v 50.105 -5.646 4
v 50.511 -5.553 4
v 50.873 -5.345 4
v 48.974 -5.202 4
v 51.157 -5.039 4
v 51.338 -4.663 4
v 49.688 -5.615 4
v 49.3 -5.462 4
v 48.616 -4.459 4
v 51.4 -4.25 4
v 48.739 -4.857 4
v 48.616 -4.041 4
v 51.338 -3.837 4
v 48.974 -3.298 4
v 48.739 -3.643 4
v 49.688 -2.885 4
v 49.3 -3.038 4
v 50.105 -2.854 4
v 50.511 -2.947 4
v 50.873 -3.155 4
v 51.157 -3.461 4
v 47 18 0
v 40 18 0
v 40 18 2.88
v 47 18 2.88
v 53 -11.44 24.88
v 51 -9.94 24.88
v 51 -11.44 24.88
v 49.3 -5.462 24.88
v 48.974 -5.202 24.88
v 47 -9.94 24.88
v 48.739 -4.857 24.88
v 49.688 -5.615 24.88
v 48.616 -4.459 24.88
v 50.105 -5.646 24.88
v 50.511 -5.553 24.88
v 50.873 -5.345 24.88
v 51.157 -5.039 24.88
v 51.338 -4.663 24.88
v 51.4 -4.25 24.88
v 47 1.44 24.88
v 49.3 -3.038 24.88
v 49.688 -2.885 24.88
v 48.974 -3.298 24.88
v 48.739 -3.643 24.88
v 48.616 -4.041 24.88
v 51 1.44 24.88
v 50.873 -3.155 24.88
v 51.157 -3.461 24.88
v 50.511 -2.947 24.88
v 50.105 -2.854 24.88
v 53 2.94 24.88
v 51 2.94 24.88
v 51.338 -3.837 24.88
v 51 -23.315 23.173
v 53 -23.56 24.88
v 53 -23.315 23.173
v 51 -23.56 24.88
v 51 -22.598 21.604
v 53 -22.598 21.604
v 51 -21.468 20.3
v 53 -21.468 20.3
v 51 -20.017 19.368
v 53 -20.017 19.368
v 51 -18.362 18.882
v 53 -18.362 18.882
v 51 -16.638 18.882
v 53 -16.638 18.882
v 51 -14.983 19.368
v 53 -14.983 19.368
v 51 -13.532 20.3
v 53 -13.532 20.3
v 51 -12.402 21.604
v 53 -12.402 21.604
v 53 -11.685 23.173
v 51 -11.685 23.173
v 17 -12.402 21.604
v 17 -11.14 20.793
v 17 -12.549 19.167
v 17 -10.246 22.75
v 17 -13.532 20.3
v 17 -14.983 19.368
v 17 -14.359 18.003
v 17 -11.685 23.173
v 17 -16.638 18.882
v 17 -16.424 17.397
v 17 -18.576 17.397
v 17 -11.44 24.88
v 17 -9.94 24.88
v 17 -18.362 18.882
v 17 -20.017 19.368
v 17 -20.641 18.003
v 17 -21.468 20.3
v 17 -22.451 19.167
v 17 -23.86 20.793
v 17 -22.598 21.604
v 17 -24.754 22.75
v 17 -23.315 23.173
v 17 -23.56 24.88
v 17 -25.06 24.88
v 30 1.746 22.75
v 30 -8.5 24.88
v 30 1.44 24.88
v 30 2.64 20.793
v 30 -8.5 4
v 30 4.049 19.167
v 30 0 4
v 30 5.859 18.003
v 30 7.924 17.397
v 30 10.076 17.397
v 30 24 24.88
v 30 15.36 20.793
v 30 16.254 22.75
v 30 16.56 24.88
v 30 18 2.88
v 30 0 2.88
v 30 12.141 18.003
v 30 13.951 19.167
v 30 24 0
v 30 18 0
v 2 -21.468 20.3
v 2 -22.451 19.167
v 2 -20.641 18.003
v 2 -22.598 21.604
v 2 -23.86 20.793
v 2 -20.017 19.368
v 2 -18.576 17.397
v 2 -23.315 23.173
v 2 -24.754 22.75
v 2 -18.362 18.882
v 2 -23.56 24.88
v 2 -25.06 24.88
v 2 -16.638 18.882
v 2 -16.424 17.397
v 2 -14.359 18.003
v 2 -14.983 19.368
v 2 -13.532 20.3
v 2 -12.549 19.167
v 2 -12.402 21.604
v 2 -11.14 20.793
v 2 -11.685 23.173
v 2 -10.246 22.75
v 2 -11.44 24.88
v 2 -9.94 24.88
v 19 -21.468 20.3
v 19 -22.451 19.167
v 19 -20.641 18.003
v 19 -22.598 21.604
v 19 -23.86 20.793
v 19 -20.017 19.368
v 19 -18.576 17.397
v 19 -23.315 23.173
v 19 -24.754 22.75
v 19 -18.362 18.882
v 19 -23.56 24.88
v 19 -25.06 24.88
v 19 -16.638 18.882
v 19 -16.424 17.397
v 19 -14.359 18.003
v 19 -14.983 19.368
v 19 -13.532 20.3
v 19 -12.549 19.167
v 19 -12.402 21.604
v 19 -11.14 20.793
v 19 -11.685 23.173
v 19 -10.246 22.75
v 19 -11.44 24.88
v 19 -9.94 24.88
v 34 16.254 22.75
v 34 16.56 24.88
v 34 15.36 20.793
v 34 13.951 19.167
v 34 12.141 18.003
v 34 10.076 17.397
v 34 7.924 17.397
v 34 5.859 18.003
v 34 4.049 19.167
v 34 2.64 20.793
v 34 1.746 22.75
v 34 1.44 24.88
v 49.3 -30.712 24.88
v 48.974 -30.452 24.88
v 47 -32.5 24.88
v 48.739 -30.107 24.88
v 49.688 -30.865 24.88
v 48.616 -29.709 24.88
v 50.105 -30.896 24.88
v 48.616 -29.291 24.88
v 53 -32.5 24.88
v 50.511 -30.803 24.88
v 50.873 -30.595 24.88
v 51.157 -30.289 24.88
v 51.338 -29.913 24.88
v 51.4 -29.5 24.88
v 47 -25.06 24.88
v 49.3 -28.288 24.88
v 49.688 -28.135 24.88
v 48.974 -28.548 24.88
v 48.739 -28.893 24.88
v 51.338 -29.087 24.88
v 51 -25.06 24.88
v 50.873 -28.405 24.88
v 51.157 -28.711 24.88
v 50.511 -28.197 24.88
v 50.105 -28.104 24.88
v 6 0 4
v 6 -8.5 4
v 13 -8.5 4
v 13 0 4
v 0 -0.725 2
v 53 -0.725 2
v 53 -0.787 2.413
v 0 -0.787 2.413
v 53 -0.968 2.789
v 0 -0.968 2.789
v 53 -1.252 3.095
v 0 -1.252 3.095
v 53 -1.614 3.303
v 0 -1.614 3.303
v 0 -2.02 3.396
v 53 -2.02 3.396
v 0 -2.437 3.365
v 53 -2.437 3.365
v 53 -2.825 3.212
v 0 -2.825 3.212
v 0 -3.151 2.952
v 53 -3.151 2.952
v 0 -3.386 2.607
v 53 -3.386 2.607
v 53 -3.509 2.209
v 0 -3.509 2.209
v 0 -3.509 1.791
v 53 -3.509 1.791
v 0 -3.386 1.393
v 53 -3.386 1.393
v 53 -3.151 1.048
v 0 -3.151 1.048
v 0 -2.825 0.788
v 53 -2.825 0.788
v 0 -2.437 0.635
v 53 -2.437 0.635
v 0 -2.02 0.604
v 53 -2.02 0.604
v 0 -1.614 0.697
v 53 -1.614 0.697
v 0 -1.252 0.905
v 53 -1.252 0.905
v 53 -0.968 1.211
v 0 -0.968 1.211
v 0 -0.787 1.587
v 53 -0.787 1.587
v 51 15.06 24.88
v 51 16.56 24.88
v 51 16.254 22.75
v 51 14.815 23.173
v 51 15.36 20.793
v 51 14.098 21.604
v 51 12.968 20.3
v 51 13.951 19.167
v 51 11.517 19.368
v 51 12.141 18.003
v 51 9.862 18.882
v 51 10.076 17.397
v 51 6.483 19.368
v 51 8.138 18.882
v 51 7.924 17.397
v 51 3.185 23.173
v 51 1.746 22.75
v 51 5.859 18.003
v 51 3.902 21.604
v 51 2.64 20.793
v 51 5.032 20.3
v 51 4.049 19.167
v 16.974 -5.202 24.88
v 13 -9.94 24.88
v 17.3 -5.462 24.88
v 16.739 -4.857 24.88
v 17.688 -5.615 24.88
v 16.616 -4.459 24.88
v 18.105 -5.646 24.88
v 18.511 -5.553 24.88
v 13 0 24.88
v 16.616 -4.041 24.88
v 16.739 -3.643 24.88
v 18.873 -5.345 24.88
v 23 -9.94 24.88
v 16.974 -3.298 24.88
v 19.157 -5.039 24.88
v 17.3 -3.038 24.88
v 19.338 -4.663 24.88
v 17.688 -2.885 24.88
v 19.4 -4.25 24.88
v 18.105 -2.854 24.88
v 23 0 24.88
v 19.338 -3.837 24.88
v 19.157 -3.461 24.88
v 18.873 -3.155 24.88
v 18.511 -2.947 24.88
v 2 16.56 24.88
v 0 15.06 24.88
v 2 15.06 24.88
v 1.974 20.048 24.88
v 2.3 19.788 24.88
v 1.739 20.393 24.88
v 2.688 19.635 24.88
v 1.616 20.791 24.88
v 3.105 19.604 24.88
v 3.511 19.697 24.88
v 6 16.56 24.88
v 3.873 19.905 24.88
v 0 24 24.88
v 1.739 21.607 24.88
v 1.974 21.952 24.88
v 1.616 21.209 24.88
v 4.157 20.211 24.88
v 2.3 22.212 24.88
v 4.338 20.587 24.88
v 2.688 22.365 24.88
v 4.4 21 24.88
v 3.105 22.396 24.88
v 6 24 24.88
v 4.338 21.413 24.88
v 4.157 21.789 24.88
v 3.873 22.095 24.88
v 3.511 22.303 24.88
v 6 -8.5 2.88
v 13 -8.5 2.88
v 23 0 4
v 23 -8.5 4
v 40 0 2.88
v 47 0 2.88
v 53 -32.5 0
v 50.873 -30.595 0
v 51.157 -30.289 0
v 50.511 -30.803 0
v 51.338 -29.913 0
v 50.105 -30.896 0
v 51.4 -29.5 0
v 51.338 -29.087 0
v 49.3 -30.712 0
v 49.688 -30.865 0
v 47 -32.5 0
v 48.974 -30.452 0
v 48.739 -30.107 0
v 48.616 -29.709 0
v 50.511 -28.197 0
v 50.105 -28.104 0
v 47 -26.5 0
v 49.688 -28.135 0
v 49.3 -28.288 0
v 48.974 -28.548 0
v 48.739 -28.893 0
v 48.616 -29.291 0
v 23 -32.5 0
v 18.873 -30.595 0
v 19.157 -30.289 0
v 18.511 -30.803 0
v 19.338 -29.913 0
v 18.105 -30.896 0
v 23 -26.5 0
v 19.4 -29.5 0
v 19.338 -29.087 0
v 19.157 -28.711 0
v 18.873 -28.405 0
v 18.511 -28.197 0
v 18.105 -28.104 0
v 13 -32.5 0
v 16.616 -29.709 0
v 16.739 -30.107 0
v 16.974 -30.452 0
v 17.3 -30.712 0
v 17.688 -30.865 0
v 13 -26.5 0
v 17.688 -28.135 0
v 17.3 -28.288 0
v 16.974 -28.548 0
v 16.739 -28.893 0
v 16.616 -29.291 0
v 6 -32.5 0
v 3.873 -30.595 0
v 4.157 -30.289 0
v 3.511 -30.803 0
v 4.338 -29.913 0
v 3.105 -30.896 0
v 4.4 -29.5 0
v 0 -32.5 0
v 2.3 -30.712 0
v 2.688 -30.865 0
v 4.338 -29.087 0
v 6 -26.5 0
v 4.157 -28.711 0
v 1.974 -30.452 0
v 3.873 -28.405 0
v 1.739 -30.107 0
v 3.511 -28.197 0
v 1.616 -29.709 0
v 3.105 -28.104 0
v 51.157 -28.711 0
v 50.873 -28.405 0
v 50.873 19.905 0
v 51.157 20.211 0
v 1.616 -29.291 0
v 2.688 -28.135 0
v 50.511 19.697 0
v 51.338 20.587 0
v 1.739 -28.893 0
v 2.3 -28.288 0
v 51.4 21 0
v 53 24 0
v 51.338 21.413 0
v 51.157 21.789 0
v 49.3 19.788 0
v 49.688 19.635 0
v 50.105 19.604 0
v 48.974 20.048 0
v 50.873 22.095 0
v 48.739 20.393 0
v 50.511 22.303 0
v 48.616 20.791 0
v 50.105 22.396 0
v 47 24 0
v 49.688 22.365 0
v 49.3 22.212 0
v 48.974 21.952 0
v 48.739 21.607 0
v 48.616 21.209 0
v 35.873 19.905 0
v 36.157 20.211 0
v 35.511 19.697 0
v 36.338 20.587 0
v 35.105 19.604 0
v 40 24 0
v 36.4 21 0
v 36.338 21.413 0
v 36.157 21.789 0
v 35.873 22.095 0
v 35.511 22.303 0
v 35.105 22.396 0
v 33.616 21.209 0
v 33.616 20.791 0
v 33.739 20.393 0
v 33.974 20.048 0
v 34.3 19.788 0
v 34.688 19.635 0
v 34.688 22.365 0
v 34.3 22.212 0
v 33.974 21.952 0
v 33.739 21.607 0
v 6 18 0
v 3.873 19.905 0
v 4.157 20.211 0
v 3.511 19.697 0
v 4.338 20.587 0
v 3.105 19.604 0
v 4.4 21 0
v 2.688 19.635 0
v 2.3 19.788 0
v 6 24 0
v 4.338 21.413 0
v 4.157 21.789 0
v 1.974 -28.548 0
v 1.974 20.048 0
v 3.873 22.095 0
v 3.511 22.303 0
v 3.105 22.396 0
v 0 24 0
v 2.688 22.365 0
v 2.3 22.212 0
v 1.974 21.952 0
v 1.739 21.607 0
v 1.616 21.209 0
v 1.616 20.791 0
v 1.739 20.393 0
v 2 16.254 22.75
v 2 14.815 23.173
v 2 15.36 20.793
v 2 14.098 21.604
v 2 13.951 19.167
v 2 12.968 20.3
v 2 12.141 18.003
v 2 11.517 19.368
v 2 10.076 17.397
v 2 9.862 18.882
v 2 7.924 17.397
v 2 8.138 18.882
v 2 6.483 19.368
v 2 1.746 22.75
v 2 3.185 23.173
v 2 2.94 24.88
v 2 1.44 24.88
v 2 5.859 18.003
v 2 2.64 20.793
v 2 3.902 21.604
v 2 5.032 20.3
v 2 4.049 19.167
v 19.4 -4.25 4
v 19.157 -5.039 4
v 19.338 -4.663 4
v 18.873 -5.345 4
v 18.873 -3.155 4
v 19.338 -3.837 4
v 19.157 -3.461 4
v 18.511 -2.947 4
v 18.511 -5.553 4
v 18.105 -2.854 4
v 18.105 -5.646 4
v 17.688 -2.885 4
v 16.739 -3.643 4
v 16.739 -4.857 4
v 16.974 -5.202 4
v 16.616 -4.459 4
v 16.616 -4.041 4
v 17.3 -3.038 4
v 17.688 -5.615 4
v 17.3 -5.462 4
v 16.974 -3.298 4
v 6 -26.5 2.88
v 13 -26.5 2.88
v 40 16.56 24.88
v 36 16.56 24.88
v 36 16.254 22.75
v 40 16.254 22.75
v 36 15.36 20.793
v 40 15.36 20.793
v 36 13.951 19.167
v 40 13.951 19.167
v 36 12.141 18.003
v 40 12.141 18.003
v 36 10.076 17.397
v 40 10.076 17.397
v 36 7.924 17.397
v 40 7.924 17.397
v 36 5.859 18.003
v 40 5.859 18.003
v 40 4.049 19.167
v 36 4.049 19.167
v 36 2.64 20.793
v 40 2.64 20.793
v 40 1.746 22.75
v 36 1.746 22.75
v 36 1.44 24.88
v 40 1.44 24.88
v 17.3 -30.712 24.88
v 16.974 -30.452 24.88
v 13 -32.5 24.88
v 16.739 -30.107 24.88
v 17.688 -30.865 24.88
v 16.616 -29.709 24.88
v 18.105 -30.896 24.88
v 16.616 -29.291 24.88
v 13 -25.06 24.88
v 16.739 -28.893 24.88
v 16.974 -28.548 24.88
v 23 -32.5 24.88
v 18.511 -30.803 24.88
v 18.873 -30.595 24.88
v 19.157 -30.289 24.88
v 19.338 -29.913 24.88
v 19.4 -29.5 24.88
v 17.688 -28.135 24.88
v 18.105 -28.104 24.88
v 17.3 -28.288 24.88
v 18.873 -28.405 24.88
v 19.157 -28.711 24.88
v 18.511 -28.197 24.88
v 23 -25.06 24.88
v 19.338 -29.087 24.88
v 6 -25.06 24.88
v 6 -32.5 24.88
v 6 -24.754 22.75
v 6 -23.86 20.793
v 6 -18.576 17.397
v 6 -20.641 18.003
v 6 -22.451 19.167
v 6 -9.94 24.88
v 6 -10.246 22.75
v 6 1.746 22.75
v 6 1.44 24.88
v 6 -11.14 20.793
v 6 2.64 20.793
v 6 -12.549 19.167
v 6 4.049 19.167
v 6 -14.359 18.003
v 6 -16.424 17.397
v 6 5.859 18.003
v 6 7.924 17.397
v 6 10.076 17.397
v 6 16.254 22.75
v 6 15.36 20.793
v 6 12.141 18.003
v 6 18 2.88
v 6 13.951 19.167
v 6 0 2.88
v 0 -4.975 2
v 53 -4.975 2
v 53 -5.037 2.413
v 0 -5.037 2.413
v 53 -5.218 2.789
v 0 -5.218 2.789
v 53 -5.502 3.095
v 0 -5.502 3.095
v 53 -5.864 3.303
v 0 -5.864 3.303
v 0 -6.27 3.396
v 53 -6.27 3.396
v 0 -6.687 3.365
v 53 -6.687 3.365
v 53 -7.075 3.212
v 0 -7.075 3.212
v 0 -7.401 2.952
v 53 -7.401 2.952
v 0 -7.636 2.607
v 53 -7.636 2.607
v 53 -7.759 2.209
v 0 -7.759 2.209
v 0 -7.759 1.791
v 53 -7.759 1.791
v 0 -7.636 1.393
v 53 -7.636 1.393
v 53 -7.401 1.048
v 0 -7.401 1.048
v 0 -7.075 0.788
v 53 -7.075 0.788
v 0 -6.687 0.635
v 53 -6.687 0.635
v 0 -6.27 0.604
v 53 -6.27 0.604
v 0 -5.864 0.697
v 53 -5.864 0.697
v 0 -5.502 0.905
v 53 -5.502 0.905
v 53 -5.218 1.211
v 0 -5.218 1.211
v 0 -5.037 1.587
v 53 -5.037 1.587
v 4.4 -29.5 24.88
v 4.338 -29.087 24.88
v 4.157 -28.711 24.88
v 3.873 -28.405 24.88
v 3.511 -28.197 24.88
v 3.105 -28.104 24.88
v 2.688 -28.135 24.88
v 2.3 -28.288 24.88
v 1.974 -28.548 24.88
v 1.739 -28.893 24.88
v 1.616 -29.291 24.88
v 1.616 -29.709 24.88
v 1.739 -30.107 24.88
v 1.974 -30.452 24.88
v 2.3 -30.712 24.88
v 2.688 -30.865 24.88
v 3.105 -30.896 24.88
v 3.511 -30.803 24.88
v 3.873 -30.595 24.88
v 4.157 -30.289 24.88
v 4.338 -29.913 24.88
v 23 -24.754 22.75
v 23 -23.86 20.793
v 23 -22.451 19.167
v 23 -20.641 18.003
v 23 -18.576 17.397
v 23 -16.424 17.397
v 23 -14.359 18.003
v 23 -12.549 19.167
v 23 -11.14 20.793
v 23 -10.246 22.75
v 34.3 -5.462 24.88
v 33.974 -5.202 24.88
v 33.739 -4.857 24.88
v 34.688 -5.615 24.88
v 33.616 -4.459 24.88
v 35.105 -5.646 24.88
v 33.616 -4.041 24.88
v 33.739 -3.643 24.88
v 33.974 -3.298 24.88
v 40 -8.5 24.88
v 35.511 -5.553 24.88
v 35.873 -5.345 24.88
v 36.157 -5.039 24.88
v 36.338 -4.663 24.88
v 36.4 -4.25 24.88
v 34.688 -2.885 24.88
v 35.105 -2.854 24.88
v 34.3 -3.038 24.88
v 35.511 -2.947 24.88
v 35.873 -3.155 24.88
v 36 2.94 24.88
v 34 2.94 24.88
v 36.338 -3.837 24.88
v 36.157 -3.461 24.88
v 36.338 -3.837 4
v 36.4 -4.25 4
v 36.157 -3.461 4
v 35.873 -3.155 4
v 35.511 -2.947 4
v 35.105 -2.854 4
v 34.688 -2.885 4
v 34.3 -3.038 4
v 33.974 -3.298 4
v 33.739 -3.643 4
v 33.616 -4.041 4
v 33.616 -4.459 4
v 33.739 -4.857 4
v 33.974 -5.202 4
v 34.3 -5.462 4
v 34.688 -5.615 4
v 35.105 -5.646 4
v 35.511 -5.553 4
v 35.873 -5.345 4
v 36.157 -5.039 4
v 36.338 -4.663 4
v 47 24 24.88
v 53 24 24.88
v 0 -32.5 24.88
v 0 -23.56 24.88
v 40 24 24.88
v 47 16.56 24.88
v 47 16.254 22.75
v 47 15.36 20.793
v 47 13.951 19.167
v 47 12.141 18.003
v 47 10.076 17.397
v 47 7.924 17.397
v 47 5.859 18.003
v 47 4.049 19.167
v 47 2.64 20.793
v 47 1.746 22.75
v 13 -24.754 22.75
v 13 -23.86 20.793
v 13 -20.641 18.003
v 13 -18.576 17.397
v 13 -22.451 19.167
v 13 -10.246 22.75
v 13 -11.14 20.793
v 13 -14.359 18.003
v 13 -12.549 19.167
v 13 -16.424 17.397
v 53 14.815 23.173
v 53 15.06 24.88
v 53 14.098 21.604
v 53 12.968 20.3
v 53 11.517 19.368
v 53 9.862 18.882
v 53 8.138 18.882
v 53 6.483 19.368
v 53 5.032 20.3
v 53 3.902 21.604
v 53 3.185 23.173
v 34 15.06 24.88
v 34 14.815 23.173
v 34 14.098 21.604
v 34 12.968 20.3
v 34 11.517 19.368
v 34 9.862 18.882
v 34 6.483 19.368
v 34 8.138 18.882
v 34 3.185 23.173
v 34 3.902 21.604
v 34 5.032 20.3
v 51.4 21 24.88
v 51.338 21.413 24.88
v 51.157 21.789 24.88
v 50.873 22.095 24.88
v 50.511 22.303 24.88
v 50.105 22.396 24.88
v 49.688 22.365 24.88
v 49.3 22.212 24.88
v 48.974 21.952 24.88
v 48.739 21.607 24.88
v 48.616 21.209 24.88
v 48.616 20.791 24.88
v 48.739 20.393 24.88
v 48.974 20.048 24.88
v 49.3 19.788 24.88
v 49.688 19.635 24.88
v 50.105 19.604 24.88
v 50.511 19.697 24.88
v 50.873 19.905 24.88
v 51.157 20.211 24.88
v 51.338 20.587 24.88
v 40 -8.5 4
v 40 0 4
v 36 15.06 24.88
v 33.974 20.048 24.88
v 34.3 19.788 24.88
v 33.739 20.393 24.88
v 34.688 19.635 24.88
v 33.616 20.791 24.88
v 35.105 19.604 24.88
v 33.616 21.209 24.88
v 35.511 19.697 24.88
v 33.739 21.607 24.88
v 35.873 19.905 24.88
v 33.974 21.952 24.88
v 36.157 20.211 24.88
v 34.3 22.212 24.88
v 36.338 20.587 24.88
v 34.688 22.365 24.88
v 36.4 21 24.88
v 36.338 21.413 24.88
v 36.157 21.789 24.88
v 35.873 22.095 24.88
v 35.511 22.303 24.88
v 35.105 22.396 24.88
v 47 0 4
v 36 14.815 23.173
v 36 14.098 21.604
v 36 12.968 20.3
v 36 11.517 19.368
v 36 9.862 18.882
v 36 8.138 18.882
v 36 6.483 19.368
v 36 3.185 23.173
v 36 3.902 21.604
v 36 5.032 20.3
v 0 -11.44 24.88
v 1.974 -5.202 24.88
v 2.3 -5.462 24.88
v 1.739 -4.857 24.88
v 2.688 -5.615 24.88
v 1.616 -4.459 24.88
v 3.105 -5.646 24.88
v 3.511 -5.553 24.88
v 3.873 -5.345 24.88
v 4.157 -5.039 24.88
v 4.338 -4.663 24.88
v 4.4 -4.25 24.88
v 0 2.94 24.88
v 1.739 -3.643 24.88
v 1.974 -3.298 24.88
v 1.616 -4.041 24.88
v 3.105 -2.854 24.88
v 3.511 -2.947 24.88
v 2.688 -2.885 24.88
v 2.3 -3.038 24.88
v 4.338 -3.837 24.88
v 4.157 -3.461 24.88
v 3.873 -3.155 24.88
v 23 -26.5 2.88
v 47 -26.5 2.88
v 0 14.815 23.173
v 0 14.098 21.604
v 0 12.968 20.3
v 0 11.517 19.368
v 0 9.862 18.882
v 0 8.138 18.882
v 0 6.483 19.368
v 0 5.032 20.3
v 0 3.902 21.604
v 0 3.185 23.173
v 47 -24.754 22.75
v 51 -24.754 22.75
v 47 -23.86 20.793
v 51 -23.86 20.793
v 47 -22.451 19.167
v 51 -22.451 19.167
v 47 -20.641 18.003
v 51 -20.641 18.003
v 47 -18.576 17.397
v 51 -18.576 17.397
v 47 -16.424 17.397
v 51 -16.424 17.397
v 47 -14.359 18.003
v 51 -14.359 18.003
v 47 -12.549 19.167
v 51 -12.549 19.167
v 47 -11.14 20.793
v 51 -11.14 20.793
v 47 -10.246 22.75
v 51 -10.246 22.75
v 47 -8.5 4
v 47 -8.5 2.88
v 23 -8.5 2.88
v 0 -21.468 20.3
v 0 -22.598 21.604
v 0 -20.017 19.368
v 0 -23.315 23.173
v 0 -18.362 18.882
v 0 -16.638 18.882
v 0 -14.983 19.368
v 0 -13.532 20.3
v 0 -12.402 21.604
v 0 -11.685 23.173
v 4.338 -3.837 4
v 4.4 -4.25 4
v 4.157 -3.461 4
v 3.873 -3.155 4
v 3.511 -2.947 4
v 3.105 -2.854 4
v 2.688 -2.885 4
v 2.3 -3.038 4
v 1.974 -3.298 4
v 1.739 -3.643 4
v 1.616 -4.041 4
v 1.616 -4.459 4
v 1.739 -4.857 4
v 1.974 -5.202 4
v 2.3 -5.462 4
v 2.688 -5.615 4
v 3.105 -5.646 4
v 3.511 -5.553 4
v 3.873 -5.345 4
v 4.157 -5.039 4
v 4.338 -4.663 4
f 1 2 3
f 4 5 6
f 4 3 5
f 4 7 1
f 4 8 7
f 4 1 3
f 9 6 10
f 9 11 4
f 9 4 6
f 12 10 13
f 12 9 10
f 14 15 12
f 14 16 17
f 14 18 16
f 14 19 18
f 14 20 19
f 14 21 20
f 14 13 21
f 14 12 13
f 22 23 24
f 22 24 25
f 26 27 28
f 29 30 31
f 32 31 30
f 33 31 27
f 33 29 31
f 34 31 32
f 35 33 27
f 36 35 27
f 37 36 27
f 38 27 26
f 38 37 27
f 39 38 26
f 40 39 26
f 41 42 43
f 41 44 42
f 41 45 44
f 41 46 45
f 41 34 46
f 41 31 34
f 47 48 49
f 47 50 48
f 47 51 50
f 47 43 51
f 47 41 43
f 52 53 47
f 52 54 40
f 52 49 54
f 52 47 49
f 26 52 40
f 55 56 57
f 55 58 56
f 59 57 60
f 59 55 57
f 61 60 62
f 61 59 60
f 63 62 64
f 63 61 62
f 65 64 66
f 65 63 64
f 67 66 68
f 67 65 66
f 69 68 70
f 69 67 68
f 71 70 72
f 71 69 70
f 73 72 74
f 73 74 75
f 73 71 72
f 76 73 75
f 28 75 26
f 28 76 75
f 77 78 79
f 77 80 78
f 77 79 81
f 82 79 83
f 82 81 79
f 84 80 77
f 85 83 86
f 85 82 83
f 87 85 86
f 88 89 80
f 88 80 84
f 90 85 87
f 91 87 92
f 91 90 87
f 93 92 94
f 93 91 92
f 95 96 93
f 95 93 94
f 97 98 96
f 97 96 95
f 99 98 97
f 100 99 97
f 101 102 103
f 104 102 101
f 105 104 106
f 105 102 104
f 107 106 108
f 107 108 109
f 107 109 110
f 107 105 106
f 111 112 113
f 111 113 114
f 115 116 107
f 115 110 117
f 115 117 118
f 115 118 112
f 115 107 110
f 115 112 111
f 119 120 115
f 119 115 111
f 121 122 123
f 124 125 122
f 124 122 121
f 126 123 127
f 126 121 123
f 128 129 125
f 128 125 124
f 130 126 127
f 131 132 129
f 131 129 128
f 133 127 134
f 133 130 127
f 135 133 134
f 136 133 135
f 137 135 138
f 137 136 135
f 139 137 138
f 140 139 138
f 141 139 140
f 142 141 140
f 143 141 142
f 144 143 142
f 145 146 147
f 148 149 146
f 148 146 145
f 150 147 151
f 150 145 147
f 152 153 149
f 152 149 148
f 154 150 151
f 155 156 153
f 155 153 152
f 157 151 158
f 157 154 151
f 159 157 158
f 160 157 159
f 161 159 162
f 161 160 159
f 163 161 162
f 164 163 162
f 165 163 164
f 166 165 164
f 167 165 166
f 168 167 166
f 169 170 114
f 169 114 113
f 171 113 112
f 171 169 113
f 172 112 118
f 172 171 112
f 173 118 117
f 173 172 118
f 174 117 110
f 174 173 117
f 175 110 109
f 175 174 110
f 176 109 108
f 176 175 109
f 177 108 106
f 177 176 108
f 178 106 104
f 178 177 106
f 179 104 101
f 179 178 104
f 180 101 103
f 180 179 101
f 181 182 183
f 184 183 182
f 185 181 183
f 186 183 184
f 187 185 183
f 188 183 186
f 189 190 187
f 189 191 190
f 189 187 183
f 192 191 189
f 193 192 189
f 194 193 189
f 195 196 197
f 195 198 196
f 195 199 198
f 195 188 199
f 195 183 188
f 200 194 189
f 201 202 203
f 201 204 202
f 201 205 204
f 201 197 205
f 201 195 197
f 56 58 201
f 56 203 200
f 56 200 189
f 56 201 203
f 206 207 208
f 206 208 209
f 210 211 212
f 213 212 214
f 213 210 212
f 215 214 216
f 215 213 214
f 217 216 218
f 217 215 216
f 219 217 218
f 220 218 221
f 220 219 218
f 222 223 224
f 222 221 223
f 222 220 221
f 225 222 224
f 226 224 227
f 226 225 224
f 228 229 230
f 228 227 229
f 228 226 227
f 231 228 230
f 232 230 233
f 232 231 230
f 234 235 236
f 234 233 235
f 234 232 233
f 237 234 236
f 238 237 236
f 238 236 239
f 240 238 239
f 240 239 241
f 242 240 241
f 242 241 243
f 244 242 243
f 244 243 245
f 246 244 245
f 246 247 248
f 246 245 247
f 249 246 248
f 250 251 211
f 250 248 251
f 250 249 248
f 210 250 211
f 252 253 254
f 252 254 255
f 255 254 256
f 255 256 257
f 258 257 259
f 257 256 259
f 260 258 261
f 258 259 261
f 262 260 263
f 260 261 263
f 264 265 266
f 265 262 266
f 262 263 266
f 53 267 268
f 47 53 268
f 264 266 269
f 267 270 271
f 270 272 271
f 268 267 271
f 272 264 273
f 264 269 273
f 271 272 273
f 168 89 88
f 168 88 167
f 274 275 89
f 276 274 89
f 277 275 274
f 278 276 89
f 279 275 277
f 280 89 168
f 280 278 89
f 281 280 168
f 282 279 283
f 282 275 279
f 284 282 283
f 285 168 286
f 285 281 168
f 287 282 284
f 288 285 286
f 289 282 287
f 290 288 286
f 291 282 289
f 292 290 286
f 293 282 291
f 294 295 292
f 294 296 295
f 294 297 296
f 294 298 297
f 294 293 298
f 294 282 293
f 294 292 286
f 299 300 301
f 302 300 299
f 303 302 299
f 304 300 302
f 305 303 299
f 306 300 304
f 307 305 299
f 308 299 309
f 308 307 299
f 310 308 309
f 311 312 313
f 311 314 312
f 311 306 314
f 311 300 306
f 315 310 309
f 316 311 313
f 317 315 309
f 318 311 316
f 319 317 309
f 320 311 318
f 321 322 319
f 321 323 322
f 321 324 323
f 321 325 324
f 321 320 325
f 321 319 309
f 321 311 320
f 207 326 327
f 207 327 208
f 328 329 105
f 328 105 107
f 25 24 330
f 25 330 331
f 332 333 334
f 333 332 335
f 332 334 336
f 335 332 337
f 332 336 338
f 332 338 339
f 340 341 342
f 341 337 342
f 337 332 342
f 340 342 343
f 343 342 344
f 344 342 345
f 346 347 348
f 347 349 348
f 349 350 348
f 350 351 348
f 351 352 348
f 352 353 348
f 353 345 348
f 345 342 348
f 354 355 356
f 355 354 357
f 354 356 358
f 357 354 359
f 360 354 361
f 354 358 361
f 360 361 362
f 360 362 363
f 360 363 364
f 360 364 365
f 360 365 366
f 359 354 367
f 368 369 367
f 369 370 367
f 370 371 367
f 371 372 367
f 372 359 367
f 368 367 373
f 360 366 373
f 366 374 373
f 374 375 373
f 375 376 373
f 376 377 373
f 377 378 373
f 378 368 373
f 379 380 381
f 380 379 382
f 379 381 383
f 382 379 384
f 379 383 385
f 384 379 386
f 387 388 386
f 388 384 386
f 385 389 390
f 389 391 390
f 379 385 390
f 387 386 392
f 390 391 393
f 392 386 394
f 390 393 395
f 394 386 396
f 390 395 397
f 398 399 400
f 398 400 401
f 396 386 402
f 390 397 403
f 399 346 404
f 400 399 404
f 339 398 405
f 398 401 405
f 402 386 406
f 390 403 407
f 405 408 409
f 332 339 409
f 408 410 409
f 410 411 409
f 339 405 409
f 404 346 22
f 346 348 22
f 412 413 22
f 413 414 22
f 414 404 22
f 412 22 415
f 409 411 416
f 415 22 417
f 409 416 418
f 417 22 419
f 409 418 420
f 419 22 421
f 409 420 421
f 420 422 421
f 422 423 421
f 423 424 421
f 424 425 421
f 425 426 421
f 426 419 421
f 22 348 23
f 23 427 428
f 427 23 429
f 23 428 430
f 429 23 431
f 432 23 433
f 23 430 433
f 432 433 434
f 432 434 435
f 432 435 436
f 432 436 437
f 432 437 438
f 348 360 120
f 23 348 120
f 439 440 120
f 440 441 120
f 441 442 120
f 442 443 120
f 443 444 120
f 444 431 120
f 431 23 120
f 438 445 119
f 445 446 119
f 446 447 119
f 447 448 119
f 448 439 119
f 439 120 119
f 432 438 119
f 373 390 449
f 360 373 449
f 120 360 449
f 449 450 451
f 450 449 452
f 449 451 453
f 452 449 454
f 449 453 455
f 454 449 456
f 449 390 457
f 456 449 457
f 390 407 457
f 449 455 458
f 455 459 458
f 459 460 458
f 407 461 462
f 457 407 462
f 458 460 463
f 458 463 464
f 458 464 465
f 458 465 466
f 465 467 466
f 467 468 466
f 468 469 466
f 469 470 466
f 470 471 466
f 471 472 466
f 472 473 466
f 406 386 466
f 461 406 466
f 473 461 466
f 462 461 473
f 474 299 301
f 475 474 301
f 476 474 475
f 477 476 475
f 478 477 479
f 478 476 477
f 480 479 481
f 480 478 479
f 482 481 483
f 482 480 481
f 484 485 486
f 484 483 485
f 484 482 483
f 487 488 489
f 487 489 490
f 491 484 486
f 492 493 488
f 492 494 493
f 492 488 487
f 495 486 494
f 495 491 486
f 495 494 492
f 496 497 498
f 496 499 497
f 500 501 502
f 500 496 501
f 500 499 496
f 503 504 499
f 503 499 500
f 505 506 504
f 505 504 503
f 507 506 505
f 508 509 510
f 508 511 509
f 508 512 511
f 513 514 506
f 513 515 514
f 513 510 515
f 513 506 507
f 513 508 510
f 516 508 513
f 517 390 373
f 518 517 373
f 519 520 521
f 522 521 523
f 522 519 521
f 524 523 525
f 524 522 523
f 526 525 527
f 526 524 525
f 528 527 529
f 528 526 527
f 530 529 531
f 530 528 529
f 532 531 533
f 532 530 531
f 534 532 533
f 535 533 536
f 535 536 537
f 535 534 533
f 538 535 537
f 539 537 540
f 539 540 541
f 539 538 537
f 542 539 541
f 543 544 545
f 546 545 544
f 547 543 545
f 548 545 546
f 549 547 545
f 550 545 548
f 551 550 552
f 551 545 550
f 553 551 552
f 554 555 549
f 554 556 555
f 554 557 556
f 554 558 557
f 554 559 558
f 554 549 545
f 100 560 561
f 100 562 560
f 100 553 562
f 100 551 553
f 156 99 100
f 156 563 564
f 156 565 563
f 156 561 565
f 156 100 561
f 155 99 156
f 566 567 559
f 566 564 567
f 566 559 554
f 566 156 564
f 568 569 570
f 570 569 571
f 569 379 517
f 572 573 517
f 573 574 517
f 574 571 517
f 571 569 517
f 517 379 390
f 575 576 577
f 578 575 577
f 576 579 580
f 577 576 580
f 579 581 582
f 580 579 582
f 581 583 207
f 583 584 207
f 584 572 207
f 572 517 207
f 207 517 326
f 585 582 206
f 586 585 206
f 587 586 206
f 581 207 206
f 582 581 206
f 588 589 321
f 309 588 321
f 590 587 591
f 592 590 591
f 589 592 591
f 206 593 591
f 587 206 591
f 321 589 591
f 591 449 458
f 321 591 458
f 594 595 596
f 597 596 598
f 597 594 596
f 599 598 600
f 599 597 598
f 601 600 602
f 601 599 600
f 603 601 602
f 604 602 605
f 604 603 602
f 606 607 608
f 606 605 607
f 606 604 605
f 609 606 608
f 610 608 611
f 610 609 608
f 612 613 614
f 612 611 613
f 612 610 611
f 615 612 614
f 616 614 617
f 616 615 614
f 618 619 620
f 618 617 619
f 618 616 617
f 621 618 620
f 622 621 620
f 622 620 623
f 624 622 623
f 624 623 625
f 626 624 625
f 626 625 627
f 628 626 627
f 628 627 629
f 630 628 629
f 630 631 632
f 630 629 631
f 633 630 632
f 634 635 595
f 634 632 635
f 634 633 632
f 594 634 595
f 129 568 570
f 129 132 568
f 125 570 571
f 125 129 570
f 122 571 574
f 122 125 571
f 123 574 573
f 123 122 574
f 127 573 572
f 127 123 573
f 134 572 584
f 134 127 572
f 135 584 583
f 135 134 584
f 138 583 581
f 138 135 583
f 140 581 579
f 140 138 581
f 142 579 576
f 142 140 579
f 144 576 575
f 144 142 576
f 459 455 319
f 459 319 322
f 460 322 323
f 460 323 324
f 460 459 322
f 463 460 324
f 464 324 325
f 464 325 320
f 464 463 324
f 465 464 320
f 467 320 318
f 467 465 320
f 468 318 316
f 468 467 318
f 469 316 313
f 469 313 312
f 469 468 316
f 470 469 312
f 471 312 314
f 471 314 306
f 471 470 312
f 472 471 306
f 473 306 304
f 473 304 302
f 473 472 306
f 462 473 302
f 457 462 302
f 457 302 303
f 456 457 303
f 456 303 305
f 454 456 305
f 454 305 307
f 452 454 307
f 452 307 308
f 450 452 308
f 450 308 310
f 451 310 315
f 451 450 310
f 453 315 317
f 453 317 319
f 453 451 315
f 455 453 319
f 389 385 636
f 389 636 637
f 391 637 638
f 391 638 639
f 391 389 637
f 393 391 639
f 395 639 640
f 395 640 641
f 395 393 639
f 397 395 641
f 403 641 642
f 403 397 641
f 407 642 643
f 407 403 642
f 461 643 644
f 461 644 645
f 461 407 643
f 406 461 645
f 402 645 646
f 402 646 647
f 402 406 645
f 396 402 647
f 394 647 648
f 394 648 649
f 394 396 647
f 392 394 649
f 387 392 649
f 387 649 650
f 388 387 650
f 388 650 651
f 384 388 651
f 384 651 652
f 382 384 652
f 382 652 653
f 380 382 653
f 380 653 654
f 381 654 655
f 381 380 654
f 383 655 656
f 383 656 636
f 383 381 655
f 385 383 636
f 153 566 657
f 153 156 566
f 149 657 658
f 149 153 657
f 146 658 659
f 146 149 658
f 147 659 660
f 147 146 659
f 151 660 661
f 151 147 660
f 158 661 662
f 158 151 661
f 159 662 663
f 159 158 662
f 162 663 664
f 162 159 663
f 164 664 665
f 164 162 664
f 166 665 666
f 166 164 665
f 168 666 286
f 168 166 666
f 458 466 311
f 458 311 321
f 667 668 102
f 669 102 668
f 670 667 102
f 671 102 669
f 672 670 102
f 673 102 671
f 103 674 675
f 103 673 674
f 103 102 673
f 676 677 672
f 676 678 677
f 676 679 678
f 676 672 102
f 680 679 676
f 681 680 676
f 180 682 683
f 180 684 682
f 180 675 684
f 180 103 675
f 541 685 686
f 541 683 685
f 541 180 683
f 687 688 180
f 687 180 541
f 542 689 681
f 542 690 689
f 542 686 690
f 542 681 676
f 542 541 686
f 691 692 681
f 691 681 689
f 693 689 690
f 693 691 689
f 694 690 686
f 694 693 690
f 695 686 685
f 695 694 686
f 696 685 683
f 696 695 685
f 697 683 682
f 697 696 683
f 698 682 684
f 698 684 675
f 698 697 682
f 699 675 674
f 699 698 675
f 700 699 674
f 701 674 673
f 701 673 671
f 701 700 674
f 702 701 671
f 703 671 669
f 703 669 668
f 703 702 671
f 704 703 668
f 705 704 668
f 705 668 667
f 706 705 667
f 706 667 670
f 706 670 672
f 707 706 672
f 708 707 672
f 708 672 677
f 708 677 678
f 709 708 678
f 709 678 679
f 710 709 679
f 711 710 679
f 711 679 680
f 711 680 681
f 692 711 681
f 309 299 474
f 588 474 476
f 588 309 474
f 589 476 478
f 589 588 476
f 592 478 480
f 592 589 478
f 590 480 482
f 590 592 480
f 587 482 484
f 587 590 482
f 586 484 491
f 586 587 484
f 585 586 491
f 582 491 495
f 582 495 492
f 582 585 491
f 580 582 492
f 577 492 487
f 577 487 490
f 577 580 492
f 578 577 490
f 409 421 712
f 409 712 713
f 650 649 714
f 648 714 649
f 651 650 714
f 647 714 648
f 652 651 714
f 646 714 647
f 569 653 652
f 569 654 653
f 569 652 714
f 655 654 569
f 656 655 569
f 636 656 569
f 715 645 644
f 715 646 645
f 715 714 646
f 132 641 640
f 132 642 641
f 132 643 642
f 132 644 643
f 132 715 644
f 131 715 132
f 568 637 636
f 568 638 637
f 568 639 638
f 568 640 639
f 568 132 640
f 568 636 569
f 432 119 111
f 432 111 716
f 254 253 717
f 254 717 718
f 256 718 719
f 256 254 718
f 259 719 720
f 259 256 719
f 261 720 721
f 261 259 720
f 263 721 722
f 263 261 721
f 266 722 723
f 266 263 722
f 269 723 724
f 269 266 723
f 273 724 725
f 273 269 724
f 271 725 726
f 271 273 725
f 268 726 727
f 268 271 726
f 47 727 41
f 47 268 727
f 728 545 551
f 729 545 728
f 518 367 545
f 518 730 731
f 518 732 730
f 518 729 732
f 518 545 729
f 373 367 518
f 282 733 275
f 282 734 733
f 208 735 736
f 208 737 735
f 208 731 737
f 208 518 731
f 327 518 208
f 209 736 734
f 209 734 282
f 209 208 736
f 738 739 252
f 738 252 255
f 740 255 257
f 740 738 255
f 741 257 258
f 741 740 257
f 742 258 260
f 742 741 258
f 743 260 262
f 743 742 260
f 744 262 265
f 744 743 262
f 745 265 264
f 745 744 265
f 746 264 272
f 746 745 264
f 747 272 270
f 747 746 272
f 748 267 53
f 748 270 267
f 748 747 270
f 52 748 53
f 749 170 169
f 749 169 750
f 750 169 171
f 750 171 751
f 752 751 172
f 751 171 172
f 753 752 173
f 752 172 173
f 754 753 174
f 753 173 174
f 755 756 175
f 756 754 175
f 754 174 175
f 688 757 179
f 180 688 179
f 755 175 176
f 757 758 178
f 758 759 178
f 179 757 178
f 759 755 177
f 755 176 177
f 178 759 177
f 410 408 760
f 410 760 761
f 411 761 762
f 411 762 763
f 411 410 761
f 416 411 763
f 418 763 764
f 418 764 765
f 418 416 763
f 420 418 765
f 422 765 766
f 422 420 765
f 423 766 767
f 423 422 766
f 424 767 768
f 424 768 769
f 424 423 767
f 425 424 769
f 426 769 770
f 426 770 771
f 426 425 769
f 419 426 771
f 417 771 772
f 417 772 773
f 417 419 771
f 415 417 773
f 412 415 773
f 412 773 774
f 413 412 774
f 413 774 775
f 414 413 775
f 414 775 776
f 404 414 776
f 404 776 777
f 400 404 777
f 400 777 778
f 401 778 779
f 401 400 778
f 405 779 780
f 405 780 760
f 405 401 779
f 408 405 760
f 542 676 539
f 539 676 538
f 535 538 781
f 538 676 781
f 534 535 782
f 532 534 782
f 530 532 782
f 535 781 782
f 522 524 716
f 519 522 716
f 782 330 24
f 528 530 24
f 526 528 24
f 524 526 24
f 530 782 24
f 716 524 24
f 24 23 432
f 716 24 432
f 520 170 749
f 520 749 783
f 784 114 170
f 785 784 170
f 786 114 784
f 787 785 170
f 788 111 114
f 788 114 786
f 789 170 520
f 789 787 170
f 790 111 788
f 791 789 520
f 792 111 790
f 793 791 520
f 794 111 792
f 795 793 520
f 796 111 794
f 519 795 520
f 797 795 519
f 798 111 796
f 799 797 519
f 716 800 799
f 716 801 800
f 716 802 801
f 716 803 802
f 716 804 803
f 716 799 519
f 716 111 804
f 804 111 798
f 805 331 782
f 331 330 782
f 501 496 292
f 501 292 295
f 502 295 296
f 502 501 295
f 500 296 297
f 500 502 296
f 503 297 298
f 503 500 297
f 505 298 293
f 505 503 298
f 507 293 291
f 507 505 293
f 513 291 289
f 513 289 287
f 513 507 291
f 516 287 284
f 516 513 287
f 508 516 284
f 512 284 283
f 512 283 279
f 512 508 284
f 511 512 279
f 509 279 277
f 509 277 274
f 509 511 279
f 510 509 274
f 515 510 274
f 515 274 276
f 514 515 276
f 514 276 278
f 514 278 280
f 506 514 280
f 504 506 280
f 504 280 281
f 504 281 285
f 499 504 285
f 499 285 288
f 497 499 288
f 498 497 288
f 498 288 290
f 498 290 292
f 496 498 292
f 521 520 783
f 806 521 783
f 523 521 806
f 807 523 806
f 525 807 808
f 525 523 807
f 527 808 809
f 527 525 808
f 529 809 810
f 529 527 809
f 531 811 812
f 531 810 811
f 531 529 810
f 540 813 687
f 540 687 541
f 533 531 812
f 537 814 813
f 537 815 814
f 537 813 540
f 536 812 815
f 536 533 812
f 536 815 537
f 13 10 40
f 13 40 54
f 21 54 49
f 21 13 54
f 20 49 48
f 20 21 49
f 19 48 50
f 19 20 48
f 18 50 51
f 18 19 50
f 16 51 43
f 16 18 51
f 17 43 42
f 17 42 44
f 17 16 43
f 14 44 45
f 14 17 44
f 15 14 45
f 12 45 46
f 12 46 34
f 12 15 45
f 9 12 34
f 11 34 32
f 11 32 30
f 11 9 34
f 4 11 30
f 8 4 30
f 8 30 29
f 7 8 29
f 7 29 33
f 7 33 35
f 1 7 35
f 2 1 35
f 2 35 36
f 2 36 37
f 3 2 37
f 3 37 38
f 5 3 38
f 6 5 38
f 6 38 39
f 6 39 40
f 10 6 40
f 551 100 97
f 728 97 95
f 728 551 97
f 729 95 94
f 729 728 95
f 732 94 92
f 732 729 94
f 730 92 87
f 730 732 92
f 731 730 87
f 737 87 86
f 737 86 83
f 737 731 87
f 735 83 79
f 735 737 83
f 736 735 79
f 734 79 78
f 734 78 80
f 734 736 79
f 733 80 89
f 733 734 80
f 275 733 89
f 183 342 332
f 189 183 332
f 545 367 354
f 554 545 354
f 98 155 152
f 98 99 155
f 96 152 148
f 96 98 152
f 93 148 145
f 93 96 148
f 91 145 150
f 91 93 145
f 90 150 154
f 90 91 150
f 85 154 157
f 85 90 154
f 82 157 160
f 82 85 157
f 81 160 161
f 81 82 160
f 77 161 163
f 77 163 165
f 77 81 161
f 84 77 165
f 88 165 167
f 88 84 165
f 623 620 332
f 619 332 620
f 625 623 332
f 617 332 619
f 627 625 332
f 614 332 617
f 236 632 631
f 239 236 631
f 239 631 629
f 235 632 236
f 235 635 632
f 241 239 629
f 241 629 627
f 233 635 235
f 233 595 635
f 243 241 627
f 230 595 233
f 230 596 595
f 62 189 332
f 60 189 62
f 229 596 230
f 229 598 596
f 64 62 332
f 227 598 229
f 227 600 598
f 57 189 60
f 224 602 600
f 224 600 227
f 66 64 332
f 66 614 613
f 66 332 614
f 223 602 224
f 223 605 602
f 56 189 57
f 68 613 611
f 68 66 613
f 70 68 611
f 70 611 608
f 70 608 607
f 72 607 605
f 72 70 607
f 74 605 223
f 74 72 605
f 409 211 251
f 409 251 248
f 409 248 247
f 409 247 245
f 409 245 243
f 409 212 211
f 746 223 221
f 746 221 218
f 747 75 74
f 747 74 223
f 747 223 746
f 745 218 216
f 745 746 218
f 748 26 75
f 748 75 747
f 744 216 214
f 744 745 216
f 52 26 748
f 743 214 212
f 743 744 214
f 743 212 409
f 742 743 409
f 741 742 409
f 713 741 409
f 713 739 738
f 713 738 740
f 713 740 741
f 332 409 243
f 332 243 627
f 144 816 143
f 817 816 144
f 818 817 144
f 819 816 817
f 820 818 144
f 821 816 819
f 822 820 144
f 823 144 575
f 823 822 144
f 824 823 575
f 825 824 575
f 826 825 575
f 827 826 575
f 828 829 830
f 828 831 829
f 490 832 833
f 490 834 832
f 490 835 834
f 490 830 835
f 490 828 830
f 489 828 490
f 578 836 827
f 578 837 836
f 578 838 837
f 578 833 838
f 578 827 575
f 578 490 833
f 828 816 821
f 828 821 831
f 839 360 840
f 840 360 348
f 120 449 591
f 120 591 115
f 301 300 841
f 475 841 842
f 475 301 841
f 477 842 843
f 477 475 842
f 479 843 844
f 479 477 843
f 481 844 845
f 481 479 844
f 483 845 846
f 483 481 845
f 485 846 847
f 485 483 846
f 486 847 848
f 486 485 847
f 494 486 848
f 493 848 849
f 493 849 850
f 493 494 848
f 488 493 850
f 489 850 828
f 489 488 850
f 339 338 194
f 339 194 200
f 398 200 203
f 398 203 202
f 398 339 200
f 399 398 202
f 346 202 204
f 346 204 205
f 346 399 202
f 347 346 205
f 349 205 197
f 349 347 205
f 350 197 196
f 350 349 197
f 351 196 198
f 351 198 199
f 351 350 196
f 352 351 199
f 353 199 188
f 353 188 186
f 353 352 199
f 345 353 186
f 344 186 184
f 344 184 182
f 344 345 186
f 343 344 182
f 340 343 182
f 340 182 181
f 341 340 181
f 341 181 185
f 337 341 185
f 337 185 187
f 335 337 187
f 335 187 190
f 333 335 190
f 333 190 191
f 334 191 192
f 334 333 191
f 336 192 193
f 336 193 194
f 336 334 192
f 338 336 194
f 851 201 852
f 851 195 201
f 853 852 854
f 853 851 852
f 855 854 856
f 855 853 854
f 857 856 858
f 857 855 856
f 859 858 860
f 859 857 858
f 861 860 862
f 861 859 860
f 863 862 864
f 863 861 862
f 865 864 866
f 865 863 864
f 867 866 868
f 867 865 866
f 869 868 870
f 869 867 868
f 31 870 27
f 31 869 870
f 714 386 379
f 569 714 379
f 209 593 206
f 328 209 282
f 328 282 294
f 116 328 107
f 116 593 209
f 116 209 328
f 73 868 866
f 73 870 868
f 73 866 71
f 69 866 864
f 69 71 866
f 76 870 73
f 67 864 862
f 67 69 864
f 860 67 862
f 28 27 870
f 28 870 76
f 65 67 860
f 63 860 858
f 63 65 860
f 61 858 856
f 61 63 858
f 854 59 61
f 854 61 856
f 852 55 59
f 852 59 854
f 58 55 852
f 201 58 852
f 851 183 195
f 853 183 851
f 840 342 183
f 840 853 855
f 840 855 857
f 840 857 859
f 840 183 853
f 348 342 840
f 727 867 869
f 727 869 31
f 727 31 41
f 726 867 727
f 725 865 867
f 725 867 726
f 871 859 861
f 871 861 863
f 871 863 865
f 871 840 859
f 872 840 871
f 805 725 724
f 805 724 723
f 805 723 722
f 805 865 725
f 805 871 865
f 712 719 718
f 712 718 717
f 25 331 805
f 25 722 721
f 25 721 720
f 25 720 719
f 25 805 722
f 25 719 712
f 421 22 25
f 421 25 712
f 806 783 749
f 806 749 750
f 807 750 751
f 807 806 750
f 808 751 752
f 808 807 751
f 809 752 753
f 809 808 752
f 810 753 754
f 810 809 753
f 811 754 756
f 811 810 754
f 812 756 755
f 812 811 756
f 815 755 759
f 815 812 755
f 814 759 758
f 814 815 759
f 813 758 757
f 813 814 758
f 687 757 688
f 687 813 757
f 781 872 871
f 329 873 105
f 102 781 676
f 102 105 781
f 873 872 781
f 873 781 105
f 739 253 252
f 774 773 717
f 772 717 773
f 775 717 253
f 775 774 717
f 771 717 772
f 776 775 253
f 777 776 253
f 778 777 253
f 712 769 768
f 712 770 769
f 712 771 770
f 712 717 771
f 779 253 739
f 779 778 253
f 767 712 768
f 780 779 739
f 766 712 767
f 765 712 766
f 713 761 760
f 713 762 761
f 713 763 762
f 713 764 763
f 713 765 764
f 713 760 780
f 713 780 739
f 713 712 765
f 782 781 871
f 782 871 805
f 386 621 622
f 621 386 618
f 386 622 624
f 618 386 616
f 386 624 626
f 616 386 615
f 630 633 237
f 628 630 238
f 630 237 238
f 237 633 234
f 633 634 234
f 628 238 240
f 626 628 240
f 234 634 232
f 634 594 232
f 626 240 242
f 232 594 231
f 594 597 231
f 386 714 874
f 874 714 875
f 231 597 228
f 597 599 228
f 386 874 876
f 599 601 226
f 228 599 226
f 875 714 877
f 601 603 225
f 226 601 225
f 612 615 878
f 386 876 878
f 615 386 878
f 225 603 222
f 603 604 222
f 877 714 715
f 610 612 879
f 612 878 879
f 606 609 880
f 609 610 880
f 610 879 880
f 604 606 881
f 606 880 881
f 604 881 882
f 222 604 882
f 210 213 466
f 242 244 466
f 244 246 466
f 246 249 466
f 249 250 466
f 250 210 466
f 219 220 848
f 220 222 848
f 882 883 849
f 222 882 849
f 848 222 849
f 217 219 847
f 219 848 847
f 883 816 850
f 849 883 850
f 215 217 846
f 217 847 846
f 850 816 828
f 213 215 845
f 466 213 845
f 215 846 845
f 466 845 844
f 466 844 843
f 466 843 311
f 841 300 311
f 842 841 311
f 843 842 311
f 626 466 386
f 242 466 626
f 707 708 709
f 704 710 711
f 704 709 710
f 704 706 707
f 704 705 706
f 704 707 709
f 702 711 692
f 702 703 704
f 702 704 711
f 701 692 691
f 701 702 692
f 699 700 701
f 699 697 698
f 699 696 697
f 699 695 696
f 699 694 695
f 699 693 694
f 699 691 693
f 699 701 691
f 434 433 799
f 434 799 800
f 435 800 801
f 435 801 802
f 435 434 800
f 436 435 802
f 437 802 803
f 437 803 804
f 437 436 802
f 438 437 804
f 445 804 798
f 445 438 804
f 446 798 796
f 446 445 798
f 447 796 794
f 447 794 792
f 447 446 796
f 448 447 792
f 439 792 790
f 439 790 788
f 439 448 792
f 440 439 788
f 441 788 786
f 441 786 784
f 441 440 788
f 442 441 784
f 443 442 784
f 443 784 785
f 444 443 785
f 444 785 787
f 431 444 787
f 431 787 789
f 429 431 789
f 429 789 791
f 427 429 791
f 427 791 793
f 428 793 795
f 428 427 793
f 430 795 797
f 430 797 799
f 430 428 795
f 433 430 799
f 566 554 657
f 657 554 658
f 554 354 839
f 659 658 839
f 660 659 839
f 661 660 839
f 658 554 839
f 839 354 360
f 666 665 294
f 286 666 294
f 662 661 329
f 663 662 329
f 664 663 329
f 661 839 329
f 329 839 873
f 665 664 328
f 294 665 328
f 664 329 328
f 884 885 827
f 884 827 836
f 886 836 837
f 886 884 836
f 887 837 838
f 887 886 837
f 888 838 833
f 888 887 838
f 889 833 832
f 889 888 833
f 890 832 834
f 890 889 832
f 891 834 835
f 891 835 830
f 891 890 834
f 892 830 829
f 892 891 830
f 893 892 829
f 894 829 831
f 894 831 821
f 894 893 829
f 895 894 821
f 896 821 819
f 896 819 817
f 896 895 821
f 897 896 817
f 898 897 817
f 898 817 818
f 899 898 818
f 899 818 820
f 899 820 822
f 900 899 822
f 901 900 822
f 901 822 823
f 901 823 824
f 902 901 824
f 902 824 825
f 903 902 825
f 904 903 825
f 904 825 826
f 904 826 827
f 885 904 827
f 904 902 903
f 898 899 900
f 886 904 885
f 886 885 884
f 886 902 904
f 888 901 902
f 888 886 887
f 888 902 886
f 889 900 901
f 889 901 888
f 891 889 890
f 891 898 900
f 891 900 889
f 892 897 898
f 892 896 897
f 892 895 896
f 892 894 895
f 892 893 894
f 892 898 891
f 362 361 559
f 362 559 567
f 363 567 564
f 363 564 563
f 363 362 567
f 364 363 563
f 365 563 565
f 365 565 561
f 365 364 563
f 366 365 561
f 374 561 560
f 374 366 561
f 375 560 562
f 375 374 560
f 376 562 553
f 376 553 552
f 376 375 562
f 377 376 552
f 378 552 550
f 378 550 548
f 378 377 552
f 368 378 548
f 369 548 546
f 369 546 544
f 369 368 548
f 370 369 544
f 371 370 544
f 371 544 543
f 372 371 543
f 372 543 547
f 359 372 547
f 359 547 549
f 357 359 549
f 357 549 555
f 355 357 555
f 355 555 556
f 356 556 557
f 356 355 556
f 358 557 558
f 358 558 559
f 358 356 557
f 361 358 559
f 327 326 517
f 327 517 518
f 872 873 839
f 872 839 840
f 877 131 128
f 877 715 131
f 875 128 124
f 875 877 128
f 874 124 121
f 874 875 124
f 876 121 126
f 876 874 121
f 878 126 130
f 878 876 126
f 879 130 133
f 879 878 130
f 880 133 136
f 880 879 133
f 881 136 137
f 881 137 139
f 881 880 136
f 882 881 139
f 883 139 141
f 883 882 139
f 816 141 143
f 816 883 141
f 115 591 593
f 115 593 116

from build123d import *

# Parameters (mm, degrees)
SKETCH001_W   = 53
SKETCH001_H   = 44.5
PAD_DEPTH     = 2.88
SKETCH_W      = 6
SKETCH_H      = 18
SKETCH_W_2    = 10
PAD001_DEPTH  = 24.88
SKETCH002_W   = 53
SKETCH002_H   = 6.06
SKETCH003_W   = 32
SKETCH003_H   = 7.56
SKETCH003_W_2 = 15
SKETCH005_W   = 6
SKETCH005_H   = 6
SKETCH005_R   = 1.4
SKETCH005_W_2 = 10
SKETCH005_H_2 = 8.5
PAD002_DEPTH  = 24.88
SKETCH006_W   = 8.5
SKETCH006_H   = 4
PAD003_DEPTH  = 53
SKETCH007_R   = 1.4
POCKET_DEPTH  = 53.001


with BuildPart() as part:
    # Sketch001 → Pad (new body)
    with BuildSketch(Plane.XY):
        with Locations((26.5, -4.25)):
            Rectangle(SKETCH001_W, SKETCH001_H)
    extrude(amount=PAD_DEPTH)

    # Sketch → Pad001 (join)
    with BuildSketch(Plane.XY):
        with Locations((3, 9)):
            Rectangle(SKETCH_W, SKETCH_H)
        with Locations((35, 9)):
            Rectangle(SKETCH_W_2, SKETCH_H)
        with Locations((3, -17.5)):
            Rectangle(SKETCH_W, SKETCH_H)
        with Locations((18, -17.5)):
            Rectangle(SKETCH_W_2, SKETCH_H)
        with Locations((50, 9)):
            Rectangle(SKETCH_W, SKETCH_H)
        with Locations((50, -17.5)):
            Rectangle(SKETCH_W, SKETCH_H)
    extrude(amount=PAD001_DEPTH)

    # Sketch002 (on Face53 of Pad001) → Groove (revolve, cut)
    with BuildSketch(Plane.XY.offset(24.88)):
        with Locations((26.5, 12.03)):
            Rectangle(SKETCH002_W, SKETCH002_H)
    revolve(axis=Axis((0, 9, 24.88), (-1, 0, 0)), mode=Mode.SUBTRACT)

    # Sketch003 (on Face36 of Groove) → Groove001 (revolve, cut)
    with BuildSketch(Plane.XY.offset(24.88)):
        with Locations((18, 12.78)):
            Rectangle(SKETCH003_W, SKETCH003_H)
        with Locations((43.5, 12.78)):
            Rectangle(SKETCH003_W_2, SKETCH003_H)
    revolve(axis=Axis((0, 9, 24.88), (-1, 0, 0)), mode=Mode.SUBTRACT)

    # Sketch004 → Groove002 (revolve, cut)
    with BuildSketch(Plane.XY.offset(24.88)):
        Polygon((0, -17.5), (53, -17.5), (53, -11.44), (51, -11.44), (51, -9.94), (47, -9.94), (47, -11.44), (23, -11.44), (23, -9.94), (19, -9.94), (19, -11.44), (17, -11.44), (17, -9.94), (2, -9.94), (2, -11.44), (0, -11.44), align=None)
    revolve(axis=Axis((0, -17.5, 24.88), (1, 0, 0)), mode=Mode.SUBTRACT)

    # Sketch005 → Pad002 (join)
    with BuildSketch(Plane.XY):
        with Locations((3, -29.5)):
            Rectangle(SKETCH005_W, SKETCH005_H)
        with Locations((3, -29.5)):
            Circle(SKETCH005_R, mode=Mode.SUBTRACT)
        with Locations((18, -29.5)):
            Rectangle(SKETCH005_W_2, SKETCH005_H)
        with Locations((18, -29.5)):
            Circle(SKETCH005_R, mode=Mode.SUBTRACT)
        with Locations((50, -29.5)):
            Rectangle(SKETCH005_W, SKETCH005_H)
        with Locations((50, -29.5)):
            Circle(SKETCH005_R, mode=Mode.SUBTRACT)
        with Locations((3, 21)):
            Rectangle(SKETCH005_W, SKETCH005_H)
        with Locations((3, 21)):
            Circle(SKETCH005_R, mode=Mode.SUBTRACT)
        with Locations((35, 21)):
            Rectangle(SKETCH005_W_2, SKETCH005_H)
        with Locations((35, 21)):
            Circle(SKETCH005_R, mode=Mode.SUBTRACT)
        with Locations((50, 21)):
            Rectangle(SKETCH005_W, SKETCH005_H)
        with Locations((50, 21)):
            Circle(SKETCH005_R, mode=Mode.SUBTRACT)
        with Locations((3, -4.25)):
            Rectangle(SKETCH005_W, SKETCH005_H_2)
        with Locations((3, -4.25)):
            Circle(SKETCH005_R, mode=Mode.SUBTRACT)
        with Locations((18, -4.25)):
            Rectangle(SKETCH005_W_2, SKETCH005_H_2)
        with Locations((18, -4.25)):
            Circle(SKETCH005_R, mode=Mode.SUBTRACT)
        with Locations((35, -4.25)):
            Rectangle(SKETCH005_W_2, SKETCH005_H_2)
        with Locations((35, -4.25)):
            Circle(SKETCH005_R, mode=Mode.SUBTRACT)
        with Locations((50, -4.25)):
            Rectangle(SKETCH005_W, SKETCH005_H_2)
        with Locations((50, -4.25)):
            Circle(SKETCH005_R, mode=Mode.SUBTRACT)
    extrude(amount=PAD002_DEPTH)

    # Sketch006 → Pad003 (join)
    with BuildSketch(Plane.YZ):
        with Locations((-4.25, 2)):
            Rectangle(SKETCH006_W, SKETCH006_H)
    extrude(amount=PAD003_DEPTH)

    # Sketch007 → Pocket (cut, through all)
    with BuildSketch(Plane.YZ):
        with Locations((-2.125, 2)):
            Circle(SKETCH007_R)
        with Locations((-6.375, 2)):
            Circle(SKETCH007_R)
    extrude(amount=POCKET_DEPTH, mode=Mode.SUBTRACT)


solid = part.part
